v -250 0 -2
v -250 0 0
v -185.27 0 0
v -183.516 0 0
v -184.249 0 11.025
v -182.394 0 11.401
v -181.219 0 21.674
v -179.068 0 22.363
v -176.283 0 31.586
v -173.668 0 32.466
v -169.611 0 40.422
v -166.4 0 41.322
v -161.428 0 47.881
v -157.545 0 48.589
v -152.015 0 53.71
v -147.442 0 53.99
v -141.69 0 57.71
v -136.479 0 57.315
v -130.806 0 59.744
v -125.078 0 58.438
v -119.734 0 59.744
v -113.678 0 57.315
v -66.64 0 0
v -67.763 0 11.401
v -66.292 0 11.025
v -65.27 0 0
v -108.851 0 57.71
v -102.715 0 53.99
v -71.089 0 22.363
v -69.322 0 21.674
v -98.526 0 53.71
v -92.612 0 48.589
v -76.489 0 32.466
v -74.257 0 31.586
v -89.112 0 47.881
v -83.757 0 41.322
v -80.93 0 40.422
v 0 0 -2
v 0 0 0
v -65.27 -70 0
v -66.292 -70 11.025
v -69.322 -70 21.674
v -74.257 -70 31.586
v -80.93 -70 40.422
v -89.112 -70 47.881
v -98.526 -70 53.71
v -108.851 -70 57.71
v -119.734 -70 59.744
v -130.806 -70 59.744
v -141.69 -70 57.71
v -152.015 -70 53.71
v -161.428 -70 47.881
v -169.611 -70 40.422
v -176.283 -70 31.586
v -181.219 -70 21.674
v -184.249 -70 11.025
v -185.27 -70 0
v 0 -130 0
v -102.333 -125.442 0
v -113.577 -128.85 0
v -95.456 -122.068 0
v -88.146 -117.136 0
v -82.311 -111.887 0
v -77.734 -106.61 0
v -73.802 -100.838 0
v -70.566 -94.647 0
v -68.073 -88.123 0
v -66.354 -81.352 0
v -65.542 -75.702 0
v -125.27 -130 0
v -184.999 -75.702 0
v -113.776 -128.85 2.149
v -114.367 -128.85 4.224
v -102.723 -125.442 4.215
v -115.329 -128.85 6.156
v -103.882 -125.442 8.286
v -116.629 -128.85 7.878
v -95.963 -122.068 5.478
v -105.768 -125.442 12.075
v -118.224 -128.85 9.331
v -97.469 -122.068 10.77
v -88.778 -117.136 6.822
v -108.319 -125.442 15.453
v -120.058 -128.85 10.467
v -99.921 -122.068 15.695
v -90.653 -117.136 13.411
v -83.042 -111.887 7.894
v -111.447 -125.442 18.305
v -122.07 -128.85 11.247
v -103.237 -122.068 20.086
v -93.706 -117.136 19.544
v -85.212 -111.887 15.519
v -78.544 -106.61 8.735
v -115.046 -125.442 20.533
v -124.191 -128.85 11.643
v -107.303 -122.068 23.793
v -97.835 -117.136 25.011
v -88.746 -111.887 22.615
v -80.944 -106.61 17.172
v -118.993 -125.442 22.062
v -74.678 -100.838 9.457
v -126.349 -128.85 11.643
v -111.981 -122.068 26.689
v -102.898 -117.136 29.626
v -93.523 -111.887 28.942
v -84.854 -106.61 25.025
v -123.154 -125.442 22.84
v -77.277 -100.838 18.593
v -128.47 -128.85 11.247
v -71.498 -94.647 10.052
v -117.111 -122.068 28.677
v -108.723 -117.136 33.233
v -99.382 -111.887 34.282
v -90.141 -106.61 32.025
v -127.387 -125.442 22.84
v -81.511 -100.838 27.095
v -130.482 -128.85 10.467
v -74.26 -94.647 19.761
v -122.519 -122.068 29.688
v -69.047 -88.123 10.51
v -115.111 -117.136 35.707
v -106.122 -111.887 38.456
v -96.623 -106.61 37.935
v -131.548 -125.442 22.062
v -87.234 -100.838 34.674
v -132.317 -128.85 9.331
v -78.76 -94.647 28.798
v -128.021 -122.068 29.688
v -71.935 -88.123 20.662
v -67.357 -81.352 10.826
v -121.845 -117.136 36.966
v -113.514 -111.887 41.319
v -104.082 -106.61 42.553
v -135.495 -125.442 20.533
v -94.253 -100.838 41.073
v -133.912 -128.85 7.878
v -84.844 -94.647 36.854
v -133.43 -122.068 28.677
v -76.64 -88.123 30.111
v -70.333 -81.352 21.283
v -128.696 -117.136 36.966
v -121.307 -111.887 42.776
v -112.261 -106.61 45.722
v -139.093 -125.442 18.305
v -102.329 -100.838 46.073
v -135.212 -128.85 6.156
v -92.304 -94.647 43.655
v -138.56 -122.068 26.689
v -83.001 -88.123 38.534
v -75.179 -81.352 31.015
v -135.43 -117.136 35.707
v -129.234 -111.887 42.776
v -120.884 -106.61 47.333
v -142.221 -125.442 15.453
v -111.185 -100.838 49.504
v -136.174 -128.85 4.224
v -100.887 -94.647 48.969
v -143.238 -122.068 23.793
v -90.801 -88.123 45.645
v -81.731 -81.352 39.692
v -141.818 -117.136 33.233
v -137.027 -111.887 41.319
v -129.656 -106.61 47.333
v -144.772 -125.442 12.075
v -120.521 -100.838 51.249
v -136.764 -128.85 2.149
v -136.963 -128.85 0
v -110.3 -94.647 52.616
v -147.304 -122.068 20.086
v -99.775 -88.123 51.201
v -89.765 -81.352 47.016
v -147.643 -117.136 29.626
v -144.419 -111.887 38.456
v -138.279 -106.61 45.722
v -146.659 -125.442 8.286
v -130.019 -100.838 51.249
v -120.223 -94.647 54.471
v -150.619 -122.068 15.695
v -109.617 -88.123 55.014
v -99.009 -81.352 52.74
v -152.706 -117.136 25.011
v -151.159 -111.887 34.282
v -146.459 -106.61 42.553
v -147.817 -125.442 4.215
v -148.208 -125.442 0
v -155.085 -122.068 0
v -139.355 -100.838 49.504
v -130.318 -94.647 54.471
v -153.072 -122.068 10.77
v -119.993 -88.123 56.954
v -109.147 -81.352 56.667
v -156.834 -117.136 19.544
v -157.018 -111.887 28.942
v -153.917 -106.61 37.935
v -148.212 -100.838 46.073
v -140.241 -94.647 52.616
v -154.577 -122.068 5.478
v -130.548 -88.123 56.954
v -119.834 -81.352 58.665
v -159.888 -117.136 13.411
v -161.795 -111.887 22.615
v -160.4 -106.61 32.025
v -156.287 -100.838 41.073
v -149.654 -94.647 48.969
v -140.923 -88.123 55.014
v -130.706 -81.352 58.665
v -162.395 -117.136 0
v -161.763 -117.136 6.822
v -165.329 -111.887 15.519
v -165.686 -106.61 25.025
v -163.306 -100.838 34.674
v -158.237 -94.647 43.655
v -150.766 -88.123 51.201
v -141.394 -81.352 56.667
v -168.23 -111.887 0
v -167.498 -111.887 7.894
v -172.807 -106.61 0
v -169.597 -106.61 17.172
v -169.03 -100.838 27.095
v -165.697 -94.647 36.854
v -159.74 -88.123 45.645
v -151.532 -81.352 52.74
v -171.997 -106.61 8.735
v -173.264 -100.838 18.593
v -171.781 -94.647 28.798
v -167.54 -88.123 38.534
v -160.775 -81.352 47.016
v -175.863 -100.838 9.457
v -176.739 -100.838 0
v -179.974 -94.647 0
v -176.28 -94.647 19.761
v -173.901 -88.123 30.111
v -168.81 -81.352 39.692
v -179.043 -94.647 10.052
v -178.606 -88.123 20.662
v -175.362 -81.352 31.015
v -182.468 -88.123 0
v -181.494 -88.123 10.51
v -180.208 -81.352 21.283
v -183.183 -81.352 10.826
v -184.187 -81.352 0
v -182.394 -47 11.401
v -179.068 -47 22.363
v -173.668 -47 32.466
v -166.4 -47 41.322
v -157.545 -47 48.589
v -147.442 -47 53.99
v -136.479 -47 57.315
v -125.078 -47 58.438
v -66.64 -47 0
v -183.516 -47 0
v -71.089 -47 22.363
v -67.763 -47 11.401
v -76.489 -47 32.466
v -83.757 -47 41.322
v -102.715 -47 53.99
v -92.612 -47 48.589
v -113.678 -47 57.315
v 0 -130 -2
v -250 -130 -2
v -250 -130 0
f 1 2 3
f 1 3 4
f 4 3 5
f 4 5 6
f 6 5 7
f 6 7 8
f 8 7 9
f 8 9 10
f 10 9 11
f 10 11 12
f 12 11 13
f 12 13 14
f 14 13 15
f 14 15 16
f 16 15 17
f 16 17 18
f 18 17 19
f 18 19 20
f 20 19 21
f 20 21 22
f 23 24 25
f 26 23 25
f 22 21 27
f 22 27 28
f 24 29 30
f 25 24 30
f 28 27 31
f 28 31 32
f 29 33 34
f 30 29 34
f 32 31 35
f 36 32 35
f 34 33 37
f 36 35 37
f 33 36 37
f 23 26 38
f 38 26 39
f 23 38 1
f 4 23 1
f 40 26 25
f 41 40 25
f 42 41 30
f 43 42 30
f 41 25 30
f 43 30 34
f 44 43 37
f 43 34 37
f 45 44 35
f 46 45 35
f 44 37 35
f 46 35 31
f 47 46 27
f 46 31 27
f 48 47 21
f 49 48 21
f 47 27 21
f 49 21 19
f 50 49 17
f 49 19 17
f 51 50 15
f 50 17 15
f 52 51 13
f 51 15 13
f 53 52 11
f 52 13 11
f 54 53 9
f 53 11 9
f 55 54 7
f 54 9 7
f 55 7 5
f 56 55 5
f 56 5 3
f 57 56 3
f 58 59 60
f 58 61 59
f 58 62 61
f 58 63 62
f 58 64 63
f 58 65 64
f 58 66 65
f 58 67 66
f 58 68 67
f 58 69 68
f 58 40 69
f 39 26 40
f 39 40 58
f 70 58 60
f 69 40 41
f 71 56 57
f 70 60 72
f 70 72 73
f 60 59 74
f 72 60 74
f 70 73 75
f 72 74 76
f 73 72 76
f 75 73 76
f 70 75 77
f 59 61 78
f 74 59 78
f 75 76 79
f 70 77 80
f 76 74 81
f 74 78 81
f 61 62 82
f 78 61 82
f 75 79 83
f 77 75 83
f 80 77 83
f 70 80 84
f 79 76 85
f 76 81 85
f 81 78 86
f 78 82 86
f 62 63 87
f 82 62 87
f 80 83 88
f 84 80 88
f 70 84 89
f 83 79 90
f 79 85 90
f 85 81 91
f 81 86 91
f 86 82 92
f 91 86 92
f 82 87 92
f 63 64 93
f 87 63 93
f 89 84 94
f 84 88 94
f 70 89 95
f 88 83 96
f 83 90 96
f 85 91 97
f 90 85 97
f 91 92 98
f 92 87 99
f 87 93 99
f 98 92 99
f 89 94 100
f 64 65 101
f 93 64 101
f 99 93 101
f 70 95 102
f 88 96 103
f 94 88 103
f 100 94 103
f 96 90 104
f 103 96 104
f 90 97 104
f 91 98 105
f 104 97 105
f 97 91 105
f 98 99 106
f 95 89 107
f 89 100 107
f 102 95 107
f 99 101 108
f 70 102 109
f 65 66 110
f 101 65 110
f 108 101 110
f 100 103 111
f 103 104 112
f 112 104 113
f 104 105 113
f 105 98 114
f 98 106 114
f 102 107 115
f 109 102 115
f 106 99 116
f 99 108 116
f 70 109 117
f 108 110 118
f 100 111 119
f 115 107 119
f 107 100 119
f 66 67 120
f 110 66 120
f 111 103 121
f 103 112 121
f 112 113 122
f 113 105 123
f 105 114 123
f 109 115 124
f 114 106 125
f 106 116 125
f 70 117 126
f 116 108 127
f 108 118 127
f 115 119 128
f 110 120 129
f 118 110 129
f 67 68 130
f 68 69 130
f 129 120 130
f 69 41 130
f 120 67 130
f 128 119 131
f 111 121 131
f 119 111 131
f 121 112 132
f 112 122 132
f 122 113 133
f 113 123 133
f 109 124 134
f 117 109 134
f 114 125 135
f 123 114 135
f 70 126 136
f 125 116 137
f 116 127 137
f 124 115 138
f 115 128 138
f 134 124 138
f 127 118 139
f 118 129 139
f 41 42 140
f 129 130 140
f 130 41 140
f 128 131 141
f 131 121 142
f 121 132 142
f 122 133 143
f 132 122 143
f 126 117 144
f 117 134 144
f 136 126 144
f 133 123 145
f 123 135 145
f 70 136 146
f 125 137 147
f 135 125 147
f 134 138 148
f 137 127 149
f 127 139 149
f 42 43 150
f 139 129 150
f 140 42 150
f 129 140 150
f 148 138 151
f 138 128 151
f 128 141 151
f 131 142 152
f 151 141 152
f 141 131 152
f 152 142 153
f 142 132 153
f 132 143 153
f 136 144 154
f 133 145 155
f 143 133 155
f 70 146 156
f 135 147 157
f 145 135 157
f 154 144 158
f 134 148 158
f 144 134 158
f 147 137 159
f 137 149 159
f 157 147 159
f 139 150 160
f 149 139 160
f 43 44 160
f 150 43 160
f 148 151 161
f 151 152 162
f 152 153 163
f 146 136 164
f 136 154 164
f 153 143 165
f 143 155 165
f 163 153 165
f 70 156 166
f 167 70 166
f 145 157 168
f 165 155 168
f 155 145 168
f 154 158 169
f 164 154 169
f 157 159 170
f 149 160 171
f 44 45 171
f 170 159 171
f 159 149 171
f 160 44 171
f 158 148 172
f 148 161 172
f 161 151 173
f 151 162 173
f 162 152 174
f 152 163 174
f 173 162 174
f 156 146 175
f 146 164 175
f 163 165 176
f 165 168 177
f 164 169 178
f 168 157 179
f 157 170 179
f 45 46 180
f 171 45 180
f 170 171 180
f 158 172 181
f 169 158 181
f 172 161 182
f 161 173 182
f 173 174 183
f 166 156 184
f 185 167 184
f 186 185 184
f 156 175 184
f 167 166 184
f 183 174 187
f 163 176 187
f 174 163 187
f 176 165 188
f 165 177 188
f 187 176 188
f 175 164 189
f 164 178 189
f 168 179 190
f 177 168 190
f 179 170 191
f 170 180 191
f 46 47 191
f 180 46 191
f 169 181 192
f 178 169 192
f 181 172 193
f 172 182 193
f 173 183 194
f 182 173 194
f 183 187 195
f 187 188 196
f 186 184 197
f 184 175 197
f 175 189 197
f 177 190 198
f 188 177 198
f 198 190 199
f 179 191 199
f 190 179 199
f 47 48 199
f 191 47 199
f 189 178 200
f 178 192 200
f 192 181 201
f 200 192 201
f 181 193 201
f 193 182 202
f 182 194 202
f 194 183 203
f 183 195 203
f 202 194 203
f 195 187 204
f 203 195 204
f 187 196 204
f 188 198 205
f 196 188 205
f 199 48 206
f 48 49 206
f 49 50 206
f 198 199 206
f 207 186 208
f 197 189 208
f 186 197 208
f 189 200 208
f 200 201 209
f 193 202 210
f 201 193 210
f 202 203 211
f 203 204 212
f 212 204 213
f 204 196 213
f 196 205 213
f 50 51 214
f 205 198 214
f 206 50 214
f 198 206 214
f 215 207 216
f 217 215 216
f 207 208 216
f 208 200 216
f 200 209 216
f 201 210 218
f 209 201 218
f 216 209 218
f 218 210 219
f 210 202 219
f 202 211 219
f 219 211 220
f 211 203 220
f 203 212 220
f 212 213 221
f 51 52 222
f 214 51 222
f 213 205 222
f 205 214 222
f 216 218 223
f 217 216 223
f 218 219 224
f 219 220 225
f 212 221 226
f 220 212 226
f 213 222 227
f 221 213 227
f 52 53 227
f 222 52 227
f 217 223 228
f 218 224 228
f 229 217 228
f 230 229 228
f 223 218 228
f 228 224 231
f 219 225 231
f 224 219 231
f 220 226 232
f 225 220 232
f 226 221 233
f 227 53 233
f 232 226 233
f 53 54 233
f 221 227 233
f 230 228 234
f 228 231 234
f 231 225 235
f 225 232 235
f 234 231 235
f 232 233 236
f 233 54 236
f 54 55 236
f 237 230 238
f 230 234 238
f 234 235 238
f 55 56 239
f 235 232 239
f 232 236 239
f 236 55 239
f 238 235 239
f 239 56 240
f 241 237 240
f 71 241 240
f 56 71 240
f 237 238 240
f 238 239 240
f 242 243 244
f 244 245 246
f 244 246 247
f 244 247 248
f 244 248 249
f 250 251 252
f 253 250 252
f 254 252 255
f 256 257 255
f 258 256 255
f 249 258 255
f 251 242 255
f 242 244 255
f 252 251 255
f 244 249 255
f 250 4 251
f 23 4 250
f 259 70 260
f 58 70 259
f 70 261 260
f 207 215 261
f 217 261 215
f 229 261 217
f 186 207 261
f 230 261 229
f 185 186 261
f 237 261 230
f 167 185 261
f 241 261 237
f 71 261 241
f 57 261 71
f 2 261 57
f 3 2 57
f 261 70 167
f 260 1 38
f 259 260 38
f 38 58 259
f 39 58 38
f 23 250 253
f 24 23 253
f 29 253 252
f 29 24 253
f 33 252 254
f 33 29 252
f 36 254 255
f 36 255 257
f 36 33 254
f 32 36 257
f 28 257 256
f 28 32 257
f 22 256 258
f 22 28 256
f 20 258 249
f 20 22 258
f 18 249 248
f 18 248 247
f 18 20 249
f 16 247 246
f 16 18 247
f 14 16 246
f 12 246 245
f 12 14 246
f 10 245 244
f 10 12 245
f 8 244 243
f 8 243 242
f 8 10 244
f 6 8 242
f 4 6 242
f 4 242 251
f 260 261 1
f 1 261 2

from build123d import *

# Parameters (mm, degrees)
F0_W     = 250
F0_H     = 130
F2_DEPTH = 2
F3_DEPTH = 130
F4_R     = 59.99999
F6_DEPTH = 47


# Not quite as in the source:
# - a fillet or chamfer is up to 0.001 mm smaller than in the source, because OpenCascade refuses the exact size


with BuildPart() as f2:
    # F0 (on Top) → F2 (new body)
    with BuildSketch(Plane.XY):
        with Locations((-125, -65)):
            Rectangle(F0_W, F0_H)
    extrude(amount=-F2_DEPTH)

    # F1 (on Front) → F3 (join)
    with BuildSketch(Plane.XZ):
        with BuildLine():
            Line((-67.4997093476, 0), (-65.2703463938, 0))
            ThreePointArc((-65.2703463938, 0), (-125.2703463938, 60), (-185.2703463938, 0))
            Line((-185.2703463938, 0), (-183.04098344, 0))
            ThreePointArc((-183.04098344, 0), (-125.2703463938, 57.7706370462), (-67.4997093476, 0))
        make_face()
        with BuildLine():
            Line((-183.04098344, 0), (-67.4997093476, 0))
            ThreePointArc((-67.4997093476, 0), (-125.2703463938, 57.7706370462), (-183.04098344, 0))
        make_face()
    extrude(amount=F3_DEPTH)

    # F4 (radius 60 in the source; OpenCascade refuses exactly that, so slightly less here)
    f4_edges = [f2.edges().sort_by_distance(p)[0] for p in [
        (-125.270346, -130, 60),
    ]]
    fillet(f4_edges, radius=F4_R)

    # F5 (on Front) → F6 (cut)
    with BuildSketch(Plane.XZ):
        with BuildLine():
            Line((-183.5164714, 0), (-66.640497432, 0))
            ThreePointArc((-66.640497432, 0), (-125.078484416, 58.437986984), (-183.5164714, 0))
        make_face()
    extrude(amount=F6_DEPTH, mode=Mode.SUBTRACT)


solid = f2.part
